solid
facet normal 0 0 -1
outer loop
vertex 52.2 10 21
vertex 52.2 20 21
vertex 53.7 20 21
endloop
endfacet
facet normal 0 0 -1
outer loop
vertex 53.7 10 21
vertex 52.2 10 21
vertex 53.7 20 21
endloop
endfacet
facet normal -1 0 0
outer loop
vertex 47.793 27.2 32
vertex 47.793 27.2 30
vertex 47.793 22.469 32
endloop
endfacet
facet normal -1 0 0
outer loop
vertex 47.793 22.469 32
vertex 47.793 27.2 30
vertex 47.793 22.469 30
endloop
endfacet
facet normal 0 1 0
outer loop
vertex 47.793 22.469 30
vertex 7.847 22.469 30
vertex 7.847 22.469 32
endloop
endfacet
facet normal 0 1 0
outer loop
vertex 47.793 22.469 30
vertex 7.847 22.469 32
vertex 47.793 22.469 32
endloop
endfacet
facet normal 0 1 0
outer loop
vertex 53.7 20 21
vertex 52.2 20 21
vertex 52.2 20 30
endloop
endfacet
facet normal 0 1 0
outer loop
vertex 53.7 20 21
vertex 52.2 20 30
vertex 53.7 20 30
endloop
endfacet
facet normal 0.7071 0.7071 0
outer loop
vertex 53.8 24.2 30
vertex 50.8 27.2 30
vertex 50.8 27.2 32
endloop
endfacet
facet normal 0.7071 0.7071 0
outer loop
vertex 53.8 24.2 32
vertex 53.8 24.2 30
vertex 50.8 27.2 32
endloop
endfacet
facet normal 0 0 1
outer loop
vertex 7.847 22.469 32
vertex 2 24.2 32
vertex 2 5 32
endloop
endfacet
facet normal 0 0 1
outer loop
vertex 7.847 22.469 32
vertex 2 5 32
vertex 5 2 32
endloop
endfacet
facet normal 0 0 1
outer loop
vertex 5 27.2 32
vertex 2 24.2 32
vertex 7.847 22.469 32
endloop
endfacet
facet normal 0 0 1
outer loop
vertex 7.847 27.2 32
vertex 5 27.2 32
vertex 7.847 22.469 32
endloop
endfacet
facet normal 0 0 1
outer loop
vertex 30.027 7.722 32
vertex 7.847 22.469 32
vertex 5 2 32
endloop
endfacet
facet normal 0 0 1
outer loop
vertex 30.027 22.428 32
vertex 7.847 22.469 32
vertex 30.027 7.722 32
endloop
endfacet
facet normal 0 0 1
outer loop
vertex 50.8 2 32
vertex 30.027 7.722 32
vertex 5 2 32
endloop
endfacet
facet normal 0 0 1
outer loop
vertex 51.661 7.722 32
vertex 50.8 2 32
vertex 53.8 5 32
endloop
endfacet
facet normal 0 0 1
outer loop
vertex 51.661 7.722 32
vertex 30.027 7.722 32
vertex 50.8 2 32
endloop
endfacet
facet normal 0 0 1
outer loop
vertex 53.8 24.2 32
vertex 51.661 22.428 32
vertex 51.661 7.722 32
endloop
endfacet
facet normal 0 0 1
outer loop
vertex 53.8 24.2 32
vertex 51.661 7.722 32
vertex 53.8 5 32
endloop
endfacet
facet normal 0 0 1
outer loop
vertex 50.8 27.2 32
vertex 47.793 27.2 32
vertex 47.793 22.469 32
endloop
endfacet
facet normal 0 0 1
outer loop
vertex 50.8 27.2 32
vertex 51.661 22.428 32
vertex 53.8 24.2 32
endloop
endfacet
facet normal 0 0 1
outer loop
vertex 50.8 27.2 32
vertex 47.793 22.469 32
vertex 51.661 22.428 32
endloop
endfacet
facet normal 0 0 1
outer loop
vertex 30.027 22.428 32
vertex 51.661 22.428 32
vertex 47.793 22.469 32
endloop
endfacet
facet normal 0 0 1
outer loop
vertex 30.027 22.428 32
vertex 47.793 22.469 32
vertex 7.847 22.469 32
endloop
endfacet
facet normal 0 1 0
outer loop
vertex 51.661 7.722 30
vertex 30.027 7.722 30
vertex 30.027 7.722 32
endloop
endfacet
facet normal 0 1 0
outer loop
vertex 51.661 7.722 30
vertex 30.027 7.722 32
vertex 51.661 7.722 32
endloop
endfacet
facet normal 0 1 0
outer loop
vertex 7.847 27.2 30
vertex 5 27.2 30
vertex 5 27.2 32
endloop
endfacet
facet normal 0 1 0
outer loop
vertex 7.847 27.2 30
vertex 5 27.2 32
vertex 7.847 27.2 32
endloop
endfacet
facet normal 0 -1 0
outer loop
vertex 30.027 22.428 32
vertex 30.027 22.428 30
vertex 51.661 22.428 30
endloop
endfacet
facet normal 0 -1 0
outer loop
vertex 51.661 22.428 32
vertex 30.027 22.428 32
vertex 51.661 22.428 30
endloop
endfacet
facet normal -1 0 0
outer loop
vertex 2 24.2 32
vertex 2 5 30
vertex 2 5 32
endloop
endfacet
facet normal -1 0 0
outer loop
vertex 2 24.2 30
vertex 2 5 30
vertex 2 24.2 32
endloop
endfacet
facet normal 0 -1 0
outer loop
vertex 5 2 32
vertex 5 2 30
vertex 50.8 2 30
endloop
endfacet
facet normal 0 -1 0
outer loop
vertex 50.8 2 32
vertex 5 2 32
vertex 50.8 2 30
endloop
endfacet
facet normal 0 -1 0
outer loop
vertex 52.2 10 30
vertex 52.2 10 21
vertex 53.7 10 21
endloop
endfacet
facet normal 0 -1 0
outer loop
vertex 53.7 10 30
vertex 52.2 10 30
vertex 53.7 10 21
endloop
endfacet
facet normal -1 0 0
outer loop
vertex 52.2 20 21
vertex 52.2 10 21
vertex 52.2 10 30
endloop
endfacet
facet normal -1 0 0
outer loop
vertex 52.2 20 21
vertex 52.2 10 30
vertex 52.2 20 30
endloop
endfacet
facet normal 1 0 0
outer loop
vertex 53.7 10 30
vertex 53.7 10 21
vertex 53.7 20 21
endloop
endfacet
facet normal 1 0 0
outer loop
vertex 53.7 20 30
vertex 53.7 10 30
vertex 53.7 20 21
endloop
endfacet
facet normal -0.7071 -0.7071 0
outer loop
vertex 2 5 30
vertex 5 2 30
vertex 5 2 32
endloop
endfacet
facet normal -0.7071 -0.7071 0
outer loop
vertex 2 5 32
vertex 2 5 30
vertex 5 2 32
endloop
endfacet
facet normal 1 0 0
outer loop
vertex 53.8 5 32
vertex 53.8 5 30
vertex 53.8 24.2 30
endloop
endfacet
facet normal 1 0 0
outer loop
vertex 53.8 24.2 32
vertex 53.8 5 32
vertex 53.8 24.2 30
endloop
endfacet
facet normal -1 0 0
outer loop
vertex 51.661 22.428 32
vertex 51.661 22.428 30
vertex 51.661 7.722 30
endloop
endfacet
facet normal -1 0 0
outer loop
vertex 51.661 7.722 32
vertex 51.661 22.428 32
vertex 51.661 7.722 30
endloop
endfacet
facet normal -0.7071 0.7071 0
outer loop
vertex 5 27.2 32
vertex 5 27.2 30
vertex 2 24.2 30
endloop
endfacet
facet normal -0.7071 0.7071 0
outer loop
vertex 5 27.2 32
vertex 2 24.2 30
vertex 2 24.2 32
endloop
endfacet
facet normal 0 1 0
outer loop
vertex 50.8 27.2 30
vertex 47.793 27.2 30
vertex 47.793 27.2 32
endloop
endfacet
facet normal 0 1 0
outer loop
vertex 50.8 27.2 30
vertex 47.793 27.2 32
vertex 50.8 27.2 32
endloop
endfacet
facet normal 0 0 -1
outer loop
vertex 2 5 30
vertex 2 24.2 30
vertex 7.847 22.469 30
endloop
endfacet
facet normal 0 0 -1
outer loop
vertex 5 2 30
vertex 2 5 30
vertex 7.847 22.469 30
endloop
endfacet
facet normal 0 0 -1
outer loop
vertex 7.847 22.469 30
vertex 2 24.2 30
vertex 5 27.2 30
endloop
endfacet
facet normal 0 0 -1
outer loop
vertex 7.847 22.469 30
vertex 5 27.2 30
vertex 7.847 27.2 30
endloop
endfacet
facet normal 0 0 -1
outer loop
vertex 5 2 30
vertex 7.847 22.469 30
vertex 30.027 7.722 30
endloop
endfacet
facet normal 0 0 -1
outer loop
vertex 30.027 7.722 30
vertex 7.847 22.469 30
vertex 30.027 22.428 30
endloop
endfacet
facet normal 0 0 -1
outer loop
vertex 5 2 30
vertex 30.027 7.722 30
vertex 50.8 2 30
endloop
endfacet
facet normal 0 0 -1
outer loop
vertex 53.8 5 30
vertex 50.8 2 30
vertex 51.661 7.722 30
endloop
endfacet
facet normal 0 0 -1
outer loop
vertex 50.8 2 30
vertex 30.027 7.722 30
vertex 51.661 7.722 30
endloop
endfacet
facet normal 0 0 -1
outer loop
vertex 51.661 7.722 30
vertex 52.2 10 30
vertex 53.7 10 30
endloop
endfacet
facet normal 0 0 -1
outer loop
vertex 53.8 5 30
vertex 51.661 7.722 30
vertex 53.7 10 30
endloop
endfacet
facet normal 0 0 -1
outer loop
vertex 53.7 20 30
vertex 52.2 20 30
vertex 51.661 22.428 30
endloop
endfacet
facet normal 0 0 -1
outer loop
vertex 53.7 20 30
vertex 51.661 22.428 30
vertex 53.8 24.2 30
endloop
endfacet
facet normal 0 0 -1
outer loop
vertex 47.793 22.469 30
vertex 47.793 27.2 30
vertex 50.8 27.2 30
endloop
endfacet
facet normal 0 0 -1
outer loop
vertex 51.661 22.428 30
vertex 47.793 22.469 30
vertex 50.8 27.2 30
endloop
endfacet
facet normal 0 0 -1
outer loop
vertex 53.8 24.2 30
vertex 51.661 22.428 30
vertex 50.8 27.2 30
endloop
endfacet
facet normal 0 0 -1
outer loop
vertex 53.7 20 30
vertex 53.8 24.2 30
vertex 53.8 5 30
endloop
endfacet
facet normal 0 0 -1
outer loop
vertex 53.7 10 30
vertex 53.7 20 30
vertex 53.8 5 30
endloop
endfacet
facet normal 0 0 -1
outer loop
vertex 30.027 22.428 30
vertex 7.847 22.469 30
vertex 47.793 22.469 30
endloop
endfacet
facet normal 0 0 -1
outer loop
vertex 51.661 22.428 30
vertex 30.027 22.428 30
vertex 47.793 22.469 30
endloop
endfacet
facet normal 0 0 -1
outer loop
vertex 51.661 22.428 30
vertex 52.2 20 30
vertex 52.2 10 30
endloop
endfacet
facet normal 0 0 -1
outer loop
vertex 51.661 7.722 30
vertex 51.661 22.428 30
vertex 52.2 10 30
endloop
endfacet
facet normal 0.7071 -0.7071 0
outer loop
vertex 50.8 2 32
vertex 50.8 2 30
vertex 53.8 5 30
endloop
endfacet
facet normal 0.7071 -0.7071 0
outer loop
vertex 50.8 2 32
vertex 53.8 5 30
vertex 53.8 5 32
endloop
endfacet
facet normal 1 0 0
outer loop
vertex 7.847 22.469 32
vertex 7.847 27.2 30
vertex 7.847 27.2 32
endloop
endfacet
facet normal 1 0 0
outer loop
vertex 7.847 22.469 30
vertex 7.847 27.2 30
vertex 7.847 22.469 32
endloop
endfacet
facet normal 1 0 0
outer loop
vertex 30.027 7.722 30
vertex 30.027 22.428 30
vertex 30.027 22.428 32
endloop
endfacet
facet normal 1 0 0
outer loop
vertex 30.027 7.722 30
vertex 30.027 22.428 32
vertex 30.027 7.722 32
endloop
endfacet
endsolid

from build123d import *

# Parameters (mm, degrees)
BOX011_W     = 1.5
BOX011_H     = 10
BOX011_DEPTH = 9
BOX010_W     = 51.8
BOX010_H     = 25.2
BOX010_DEPTH = 2
CHAMFER_SIZE = 3
SKETCH_W     = 21.634724
SKETCH_H     = 14.706005
SKETCH_W_2   = 39.946578
SKETCH_H_2   = 4.737023
POCKET_DEPTH = 3


with BuildPart() as controler_support001:
    # Box011 → Box011 (new body)
    with BuildSketch(Plane(origin=(52.2, 10, 21), x_dir=(1, 0, 0), z_dir=(0, 0, 1))):
        with Locations((0.75, 5)):
            Rectangle(BOX011_W, BOX011_H)
    extrude(amount=BOX011_DEPTH)


with BuildPart() as bat_controller_sep:
    # Box010 → Box010 (new body)
    with BuildSketch(Plane(origin=(2, 2, 30), x_dir=(1, 0, 0), z_dir=(0, 0, 1))):
        with Locations((25.9, 12.6)):
            Rectangle(BOX010_W, BOX010_H)
    extrude(amount=BOX010_DEPTH)

    # Chamfer
    chamfer_edges = [bat_controller_sep.edges().sort_by_distance(p)[0] for p in [
        (2, 2, 31),
        (2, 27.2, 31),
        (53.8, 2, 31),
        (53.8, 27.2, 31),
    ]]
    chamfer(chamfer_edges, length=CHAMFER_SIZE)

    # Sketch (on Face5 of Chamfer) → Pocket (cut)
    with BuildSketch(Plane(origin=(0, 0, 30), x_dir=(1, 0, 0), z_dir=(0, 0, -1))):
        with Locations((40.844102, -15.075252)):
            Rectangle(SKETCH_W, SKETCH_H)
        with Locations((27.819974, -24.837604)):
            Rectangle(SKETCH_W_2, SKETCH_H_2)
    extrude(amount=-POCKET_DEPTH, mode=Mode.SUBTRACT)

    # Fusion008: union controler_support001
    add(controler_support001.part)


solid = bat_controller_sep.part
